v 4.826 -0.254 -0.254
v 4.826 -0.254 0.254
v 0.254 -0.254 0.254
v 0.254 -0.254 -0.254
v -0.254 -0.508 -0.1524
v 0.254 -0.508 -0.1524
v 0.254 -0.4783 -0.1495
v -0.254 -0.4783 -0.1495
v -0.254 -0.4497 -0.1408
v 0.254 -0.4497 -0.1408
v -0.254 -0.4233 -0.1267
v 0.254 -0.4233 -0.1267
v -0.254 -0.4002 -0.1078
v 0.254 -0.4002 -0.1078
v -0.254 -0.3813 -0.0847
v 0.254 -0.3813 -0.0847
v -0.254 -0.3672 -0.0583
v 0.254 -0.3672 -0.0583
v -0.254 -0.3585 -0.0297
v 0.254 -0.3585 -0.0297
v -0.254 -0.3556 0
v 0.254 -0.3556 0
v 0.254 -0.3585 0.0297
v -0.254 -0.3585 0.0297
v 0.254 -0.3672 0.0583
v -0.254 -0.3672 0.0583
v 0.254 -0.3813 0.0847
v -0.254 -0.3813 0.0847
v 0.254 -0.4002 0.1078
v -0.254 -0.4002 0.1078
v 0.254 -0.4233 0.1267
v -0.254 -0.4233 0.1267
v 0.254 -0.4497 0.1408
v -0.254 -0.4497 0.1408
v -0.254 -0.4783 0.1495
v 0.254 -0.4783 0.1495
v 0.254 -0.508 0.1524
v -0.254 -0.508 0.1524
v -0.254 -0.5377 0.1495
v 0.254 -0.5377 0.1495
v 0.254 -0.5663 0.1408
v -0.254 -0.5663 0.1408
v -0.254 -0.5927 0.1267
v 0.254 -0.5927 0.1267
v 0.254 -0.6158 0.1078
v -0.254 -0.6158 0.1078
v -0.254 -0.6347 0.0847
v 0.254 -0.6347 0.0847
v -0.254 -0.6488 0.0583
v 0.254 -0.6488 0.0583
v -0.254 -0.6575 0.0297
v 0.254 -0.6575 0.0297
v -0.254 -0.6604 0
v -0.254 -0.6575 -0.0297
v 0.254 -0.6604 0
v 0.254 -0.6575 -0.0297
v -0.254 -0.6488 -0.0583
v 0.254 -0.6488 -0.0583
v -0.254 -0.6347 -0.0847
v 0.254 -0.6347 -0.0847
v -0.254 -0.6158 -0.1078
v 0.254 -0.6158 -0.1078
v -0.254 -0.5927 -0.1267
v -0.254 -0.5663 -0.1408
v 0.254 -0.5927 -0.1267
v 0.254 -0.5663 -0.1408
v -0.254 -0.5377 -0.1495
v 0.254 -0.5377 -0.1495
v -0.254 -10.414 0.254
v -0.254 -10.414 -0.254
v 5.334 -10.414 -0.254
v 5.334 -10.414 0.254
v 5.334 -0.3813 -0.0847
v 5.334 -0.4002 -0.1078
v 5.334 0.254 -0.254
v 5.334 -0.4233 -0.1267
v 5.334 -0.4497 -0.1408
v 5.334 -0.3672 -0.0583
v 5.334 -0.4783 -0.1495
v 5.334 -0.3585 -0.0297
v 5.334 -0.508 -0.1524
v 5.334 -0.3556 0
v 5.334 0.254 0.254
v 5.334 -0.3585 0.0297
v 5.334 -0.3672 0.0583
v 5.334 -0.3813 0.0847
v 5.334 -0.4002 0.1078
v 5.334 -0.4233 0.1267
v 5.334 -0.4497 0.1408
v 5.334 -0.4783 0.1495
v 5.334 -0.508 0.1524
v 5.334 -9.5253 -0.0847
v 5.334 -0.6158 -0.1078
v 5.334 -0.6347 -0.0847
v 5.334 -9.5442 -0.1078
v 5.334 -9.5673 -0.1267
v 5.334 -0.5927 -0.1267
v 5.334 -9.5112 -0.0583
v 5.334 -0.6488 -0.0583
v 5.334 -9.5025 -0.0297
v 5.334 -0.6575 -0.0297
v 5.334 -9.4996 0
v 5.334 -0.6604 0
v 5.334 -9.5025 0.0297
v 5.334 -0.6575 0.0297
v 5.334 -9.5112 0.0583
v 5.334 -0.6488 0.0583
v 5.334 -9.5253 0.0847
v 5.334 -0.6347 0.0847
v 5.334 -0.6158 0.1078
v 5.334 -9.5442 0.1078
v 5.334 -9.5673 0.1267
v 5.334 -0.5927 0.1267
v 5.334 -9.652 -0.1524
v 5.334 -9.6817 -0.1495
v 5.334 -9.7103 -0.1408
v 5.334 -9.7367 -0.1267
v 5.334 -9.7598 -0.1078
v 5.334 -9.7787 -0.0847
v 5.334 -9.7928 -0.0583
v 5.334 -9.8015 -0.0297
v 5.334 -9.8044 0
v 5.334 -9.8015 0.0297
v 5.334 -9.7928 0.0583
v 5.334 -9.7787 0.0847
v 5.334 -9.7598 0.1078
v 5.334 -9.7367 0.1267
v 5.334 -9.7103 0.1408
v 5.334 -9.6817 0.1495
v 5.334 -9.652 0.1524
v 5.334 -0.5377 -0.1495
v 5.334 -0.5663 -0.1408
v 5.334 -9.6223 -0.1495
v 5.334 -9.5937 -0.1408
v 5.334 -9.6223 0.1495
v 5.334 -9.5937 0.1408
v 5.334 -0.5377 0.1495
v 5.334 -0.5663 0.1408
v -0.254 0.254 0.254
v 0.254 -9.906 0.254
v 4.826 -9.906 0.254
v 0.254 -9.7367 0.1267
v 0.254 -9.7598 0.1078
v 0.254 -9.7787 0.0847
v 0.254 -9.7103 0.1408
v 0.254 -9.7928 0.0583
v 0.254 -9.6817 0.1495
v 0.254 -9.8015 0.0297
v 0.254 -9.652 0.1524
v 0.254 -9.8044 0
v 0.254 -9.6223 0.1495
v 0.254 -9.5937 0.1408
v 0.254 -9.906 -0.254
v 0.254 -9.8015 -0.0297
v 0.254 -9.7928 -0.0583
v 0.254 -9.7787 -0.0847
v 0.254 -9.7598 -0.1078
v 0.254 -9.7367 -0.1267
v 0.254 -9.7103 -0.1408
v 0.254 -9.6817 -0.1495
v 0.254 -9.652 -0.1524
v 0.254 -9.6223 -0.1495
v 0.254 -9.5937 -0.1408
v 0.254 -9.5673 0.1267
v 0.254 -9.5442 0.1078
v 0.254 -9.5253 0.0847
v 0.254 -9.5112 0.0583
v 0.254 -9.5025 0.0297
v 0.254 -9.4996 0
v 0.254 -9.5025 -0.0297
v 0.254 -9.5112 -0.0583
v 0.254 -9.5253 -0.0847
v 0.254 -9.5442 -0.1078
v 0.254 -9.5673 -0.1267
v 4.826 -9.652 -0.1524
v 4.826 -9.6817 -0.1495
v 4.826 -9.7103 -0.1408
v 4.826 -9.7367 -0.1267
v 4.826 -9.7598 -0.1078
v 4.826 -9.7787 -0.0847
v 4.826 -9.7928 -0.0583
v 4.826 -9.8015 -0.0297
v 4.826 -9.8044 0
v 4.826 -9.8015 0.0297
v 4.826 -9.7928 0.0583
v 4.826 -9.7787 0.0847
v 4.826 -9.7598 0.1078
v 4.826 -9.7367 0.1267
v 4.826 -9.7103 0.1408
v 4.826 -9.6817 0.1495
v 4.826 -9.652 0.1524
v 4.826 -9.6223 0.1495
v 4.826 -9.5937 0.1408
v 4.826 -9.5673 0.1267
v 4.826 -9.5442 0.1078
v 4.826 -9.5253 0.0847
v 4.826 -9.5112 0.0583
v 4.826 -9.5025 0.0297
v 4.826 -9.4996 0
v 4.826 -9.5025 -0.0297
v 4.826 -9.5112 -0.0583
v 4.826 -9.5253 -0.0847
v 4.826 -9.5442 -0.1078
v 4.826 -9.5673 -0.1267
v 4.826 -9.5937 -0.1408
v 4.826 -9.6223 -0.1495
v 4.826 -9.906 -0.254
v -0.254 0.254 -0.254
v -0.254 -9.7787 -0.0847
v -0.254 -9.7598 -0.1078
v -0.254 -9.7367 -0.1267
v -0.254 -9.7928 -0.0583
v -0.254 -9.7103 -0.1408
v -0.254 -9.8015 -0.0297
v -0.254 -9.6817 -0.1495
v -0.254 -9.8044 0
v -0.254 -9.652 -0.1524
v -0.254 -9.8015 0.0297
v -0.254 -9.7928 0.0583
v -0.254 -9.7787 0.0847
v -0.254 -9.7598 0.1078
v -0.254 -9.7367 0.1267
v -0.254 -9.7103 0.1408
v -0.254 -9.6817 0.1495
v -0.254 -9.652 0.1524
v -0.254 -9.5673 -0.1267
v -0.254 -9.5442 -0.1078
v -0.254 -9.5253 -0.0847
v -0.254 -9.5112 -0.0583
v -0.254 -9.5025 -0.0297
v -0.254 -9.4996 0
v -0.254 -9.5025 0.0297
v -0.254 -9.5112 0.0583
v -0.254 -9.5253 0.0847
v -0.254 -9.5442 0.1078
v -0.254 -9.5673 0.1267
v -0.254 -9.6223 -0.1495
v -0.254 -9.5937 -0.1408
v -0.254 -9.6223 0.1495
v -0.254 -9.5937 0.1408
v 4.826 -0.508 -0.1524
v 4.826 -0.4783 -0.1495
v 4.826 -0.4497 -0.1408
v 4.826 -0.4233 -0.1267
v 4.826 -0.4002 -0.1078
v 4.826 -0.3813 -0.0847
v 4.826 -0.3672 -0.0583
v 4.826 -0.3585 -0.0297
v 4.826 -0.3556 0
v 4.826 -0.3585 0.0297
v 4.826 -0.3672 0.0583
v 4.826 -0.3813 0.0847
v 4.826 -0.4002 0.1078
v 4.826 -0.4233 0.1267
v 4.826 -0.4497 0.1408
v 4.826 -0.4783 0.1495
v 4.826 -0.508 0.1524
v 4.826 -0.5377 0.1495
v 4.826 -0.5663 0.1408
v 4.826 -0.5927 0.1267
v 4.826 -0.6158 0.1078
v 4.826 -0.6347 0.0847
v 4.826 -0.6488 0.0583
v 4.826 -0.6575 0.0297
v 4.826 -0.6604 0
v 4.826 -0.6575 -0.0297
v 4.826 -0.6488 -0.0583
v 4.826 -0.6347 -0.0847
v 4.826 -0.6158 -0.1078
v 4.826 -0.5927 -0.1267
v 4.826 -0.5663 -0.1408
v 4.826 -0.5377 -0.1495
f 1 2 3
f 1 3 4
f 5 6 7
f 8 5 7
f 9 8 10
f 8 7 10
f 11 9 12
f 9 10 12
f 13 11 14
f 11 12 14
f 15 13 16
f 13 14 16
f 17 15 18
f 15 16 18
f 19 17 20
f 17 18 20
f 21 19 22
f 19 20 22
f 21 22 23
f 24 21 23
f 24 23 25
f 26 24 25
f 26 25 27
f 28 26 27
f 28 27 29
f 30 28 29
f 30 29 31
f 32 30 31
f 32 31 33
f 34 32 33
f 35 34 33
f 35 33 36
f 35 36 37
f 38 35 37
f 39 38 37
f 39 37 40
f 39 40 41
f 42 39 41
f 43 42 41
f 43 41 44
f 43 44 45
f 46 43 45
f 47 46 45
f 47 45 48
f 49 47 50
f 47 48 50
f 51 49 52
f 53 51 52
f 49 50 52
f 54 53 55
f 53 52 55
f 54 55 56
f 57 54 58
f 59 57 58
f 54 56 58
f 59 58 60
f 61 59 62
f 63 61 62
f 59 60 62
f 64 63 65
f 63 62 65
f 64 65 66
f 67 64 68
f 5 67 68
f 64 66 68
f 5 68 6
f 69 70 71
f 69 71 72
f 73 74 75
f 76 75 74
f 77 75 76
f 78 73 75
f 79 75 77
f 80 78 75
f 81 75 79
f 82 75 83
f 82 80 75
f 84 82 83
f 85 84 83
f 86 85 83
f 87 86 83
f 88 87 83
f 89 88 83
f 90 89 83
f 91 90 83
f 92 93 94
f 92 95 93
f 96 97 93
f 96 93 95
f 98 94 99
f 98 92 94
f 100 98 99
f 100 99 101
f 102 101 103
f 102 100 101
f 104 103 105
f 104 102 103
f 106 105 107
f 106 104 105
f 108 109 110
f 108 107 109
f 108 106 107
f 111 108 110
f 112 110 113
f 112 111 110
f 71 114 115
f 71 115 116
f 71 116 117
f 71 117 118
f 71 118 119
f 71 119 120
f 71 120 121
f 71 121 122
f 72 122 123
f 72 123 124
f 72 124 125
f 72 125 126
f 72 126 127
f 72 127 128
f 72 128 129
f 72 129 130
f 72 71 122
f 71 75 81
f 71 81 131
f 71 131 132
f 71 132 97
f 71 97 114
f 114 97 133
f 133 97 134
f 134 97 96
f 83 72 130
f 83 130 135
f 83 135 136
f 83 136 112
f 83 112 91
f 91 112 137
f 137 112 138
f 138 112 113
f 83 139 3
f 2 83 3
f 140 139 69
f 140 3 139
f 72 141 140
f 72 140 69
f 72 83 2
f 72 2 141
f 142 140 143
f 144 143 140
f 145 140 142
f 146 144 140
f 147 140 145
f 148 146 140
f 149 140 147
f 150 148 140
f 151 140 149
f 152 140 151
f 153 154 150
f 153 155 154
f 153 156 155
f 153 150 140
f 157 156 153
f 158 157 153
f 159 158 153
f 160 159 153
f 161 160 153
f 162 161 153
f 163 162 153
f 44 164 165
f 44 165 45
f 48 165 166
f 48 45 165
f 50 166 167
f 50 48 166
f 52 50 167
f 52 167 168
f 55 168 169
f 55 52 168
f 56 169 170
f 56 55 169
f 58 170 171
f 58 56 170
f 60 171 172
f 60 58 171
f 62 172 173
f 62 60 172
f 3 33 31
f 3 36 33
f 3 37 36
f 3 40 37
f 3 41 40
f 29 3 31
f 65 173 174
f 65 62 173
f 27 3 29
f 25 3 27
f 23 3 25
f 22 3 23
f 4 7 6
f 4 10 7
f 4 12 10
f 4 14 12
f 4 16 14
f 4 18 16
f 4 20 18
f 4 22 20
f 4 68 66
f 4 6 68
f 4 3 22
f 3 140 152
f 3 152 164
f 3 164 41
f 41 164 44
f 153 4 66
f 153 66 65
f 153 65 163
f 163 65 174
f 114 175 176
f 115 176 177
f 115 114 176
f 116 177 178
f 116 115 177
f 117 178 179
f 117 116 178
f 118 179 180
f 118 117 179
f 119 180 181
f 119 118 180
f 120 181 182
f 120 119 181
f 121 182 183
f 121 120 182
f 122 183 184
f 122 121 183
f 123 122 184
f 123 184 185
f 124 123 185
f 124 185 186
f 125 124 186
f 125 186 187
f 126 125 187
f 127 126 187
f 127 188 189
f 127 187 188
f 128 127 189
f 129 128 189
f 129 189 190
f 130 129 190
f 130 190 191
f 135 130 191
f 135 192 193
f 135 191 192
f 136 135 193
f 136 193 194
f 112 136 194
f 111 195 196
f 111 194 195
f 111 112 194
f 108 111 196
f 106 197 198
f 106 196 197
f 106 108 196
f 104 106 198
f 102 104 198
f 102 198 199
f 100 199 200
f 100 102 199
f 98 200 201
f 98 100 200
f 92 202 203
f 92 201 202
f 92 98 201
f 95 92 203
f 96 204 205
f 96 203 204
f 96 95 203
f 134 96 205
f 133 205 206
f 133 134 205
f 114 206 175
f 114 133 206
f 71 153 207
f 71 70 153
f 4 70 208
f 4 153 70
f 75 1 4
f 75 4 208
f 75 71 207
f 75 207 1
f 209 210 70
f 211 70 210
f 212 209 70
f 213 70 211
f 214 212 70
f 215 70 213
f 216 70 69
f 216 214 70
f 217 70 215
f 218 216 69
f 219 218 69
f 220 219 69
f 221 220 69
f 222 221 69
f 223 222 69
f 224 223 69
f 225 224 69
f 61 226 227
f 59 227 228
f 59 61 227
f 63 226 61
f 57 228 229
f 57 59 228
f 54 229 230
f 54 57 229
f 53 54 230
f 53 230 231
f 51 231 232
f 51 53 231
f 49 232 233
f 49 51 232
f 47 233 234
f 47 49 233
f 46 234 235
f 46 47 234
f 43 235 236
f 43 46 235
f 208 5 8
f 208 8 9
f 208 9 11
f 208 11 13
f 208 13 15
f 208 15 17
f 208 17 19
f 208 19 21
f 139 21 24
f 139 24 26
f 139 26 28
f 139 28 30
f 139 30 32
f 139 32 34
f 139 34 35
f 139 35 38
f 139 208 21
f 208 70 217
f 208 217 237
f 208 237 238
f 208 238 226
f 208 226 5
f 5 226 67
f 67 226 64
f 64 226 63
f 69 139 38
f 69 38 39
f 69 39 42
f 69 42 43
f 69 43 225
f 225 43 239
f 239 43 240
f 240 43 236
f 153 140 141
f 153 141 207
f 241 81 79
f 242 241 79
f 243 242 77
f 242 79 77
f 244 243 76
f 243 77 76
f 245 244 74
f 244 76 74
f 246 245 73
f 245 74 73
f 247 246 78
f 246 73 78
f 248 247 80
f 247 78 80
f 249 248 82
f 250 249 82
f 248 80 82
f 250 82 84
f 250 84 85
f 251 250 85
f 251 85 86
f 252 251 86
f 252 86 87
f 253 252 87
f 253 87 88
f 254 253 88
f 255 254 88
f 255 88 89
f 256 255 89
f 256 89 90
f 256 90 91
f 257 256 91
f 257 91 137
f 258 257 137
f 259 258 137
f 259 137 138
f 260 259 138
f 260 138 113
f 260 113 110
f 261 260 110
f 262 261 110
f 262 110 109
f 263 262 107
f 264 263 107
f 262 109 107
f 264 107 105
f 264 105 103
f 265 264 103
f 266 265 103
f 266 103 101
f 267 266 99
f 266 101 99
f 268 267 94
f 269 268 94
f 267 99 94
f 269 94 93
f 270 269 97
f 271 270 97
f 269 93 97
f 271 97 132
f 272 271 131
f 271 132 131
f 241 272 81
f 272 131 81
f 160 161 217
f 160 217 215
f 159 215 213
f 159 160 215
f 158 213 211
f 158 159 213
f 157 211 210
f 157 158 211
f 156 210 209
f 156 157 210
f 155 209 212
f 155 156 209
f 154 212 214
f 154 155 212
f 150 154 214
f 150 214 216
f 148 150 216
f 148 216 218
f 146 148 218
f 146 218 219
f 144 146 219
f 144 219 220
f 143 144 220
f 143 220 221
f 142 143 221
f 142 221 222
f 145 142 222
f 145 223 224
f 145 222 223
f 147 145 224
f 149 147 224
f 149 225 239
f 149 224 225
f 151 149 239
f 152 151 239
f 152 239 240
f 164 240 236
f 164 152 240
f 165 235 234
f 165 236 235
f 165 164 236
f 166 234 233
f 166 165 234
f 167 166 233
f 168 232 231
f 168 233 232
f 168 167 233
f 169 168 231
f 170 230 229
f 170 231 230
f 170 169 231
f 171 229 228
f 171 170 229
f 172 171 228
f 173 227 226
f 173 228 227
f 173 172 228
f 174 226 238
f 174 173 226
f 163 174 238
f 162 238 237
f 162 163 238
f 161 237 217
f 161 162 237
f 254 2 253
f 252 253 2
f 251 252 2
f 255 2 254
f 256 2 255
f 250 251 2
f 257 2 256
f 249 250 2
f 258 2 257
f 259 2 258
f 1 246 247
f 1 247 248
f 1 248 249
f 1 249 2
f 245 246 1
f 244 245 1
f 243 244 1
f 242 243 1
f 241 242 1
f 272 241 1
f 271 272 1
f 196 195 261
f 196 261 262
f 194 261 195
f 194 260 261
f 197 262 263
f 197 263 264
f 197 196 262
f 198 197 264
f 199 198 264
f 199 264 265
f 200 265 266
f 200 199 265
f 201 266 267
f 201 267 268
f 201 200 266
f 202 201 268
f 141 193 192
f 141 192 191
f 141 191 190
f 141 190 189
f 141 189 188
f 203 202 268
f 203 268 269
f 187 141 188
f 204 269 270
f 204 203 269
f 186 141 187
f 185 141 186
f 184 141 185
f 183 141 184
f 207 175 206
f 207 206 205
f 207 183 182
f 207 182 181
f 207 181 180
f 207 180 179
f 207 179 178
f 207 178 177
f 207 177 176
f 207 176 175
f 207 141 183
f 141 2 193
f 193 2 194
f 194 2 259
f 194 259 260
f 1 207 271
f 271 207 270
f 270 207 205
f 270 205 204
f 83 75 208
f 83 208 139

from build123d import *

# Parameters (mm, degrees)
SKETCH1_W          = 0.508
SKETCH1_H          = 0.508
SKETCH2_R          = 0.1524
CUT_EXTRUDE1_DEPTH = 12.821237499


with BuildPart() as part:
    # Sweep1: sweep along a curve in space
    with BuildLine() as sweep1_path:
        Line((0, 0, 0), (5.08, 0, 0))
        Line((5.08, 0, 0), (5.08, -10.16, 0))
        Line((5.08, -10.16, 0), (0, -10.16, 0))
        Line((0, -10.16, 0), (0, 0, 0))
    # Sketch1 → Sweep1 (sweep)
    with BuildSketch(Plane(origin=(0, 0, 0), x_dir=(0, 0, -1), z_dir=(1, 0, 0))):
        Rectangle(SKETCH1_W, SKETCH1_H)
    sweep(path=sweep1_path.line, transition=Transition.RIGHT)

    # Sketch2 → Cut-Extrude1 (cut, through all)
    with BuildSketch(Plane(origin=(5.334, 0, 0), x_dir=(0, 0, -1), z_dir=(1, 0, 0))):
        with Locations((0, -0.508)):
            Circle(SKETCH2_R)
    cut_extrude1 = extrude(amount=-CUT_EXTRUDE1_DEPTH, mode=Mode.SUBTRACT)

    # Mirror1: Cut-Extrude1 across plane
    add(cut_extrude1.mirror(Plane.ZX.offset(-5.08)), mode=Mode.SUBTRACT)


solid = part.part
